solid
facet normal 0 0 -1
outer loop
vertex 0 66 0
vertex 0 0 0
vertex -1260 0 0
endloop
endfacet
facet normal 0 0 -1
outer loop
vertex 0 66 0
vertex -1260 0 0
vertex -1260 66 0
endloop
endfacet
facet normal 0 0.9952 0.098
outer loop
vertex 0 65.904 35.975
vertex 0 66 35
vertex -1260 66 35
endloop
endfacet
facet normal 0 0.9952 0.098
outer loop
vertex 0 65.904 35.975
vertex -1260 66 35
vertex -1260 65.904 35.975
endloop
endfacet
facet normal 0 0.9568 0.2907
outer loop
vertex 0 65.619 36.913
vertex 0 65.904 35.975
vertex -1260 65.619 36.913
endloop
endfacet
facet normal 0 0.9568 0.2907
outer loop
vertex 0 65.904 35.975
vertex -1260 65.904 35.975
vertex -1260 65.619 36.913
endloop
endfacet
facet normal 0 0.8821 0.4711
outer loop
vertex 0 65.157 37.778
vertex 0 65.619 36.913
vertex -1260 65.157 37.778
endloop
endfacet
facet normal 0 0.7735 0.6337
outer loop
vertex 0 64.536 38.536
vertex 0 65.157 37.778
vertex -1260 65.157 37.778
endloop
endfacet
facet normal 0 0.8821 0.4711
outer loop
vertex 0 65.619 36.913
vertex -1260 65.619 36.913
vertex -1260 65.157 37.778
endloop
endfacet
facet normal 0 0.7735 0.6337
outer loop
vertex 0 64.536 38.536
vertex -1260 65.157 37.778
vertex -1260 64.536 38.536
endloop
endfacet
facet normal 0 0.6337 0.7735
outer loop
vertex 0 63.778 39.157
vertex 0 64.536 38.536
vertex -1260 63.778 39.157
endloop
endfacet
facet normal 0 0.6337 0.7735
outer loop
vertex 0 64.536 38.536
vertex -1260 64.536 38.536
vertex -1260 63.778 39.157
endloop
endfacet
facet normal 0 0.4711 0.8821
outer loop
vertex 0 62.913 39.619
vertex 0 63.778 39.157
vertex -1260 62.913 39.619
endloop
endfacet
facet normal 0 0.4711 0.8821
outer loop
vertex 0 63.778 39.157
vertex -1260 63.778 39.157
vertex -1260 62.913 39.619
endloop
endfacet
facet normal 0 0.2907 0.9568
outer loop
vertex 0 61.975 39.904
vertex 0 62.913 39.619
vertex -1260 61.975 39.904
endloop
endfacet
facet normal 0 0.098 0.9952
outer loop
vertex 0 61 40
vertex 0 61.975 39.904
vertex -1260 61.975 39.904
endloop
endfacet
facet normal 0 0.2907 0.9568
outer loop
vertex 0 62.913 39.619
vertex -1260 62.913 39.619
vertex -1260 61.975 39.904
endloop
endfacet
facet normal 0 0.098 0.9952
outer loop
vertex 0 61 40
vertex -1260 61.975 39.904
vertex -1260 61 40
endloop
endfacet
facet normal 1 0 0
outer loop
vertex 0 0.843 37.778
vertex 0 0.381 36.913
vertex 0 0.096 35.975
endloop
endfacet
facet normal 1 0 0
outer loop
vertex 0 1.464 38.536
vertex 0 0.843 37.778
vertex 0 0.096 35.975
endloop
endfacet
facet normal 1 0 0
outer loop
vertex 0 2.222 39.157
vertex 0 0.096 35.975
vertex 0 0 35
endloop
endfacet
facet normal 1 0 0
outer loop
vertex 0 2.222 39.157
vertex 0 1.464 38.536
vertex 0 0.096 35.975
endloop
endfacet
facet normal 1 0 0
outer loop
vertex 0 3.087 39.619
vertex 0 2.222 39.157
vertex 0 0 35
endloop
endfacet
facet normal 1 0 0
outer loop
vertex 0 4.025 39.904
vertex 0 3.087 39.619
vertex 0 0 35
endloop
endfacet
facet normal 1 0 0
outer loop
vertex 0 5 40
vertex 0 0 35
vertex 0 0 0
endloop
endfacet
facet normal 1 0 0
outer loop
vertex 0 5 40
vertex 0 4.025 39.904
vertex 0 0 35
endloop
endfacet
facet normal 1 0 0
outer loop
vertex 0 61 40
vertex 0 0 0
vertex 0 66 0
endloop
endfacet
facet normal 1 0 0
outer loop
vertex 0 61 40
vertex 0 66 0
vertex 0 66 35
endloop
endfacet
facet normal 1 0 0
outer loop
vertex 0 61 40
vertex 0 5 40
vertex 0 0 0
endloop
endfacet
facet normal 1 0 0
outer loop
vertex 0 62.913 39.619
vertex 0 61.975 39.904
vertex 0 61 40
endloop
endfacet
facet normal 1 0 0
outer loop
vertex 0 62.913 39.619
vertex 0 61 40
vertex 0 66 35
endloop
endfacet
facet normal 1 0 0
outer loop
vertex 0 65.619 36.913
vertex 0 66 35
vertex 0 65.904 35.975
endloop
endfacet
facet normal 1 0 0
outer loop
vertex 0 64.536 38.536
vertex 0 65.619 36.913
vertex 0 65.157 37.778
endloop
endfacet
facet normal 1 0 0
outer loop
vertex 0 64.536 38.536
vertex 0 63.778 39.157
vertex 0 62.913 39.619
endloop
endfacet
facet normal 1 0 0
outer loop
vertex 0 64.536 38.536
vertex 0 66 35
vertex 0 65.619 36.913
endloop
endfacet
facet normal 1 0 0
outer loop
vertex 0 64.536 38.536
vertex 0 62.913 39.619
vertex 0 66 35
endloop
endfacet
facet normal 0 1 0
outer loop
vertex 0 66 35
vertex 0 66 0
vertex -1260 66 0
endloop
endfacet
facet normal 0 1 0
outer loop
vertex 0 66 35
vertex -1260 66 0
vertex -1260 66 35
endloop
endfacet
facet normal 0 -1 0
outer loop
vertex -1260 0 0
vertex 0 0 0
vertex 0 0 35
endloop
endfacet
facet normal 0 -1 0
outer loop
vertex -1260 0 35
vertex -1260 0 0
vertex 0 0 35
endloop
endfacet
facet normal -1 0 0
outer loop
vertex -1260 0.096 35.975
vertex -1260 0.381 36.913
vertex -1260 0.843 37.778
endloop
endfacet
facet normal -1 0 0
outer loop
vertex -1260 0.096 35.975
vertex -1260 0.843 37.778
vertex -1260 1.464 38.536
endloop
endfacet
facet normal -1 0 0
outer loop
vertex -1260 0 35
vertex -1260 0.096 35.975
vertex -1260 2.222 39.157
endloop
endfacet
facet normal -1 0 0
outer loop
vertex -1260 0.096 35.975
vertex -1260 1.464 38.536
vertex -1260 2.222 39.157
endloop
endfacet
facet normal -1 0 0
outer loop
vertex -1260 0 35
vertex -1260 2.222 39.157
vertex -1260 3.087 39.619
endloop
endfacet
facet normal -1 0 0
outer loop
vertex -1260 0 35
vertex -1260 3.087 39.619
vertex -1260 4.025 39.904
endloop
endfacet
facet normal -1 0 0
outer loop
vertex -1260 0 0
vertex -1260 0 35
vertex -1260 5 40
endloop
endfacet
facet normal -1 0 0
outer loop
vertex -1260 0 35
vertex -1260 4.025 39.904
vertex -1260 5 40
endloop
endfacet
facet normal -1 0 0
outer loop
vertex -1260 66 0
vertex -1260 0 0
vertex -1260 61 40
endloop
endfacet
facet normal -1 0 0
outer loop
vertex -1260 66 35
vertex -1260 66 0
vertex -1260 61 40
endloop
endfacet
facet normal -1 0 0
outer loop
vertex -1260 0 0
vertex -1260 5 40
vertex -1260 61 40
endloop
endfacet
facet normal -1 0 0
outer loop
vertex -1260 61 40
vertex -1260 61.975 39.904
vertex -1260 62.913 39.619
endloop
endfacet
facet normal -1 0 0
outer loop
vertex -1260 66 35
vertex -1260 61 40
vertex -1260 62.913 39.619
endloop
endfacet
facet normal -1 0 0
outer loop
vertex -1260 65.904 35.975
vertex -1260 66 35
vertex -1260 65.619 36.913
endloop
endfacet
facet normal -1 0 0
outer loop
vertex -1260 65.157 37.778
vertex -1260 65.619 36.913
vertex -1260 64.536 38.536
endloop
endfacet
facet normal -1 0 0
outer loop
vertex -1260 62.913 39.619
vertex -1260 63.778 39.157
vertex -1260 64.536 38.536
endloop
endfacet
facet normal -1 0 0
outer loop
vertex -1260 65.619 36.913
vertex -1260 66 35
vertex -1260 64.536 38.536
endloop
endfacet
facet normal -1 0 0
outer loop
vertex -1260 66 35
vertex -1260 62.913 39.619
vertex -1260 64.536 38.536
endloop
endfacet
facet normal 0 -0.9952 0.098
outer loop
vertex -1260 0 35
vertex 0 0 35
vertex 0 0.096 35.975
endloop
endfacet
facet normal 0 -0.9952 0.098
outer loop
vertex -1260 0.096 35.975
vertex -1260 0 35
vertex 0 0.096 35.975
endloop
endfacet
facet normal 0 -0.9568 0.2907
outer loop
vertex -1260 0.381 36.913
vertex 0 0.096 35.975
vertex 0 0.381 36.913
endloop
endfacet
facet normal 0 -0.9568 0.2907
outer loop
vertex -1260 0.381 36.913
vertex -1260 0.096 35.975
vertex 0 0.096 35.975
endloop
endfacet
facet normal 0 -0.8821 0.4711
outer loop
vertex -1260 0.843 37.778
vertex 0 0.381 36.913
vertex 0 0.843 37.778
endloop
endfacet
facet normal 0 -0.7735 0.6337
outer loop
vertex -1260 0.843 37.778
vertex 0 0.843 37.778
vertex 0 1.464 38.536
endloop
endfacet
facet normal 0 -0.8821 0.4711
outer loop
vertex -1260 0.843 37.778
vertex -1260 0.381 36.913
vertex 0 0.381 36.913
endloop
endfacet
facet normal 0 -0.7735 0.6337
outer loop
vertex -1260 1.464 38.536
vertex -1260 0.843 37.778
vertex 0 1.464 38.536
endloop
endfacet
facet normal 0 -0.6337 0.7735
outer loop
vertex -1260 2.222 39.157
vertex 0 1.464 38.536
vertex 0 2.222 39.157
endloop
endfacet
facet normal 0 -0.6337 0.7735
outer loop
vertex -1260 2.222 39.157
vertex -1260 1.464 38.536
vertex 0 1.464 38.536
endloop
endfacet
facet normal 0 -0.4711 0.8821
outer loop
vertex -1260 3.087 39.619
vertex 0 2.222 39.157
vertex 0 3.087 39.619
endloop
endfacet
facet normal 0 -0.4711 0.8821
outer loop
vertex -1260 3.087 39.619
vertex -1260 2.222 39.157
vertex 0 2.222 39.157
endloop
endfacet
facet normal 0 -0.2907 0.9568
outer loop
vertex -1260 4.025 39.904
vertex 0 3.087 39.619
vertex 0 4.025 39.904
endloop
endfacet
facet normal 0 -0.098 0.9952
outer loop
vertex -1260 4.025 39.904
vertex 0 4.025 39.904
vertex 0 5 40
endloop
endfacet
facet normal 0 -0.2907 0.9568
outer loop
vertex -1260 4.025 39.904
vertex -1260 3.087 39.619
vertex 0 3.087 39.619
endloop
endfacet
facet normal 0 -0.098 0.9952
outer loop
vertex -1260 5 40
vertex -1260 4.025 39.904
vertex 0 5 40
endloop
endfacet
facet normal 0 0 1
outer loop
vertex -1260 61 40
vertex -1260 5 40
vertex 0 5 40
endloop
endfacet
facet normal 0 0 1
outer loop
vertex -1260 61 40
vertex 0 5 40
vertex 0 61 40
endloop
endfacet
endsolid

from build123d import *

# Parameters (mm, degrees)
F0_W     = 66
F0_H     = 40
F1_DEPTH = 1260
F2_R     = 5


with BuildPart() as f1:
    # F0 (on Right) → F1 (new body)
    with BuildSketch(Plane.YZ):
        with Locations((33, 20)):
            Rectangle(F0_W, F0_H)
    extrude(amount=-F1_DEPTH)

    # F2
    f2_edges = [f1.edges().sort_by_distance(p)[0] for p in [
        (-630, 0, 40),
        (-630, 66, 40),
    ]]
    fillet(f2_edges, radius=F2_R)


solid = f1.part
